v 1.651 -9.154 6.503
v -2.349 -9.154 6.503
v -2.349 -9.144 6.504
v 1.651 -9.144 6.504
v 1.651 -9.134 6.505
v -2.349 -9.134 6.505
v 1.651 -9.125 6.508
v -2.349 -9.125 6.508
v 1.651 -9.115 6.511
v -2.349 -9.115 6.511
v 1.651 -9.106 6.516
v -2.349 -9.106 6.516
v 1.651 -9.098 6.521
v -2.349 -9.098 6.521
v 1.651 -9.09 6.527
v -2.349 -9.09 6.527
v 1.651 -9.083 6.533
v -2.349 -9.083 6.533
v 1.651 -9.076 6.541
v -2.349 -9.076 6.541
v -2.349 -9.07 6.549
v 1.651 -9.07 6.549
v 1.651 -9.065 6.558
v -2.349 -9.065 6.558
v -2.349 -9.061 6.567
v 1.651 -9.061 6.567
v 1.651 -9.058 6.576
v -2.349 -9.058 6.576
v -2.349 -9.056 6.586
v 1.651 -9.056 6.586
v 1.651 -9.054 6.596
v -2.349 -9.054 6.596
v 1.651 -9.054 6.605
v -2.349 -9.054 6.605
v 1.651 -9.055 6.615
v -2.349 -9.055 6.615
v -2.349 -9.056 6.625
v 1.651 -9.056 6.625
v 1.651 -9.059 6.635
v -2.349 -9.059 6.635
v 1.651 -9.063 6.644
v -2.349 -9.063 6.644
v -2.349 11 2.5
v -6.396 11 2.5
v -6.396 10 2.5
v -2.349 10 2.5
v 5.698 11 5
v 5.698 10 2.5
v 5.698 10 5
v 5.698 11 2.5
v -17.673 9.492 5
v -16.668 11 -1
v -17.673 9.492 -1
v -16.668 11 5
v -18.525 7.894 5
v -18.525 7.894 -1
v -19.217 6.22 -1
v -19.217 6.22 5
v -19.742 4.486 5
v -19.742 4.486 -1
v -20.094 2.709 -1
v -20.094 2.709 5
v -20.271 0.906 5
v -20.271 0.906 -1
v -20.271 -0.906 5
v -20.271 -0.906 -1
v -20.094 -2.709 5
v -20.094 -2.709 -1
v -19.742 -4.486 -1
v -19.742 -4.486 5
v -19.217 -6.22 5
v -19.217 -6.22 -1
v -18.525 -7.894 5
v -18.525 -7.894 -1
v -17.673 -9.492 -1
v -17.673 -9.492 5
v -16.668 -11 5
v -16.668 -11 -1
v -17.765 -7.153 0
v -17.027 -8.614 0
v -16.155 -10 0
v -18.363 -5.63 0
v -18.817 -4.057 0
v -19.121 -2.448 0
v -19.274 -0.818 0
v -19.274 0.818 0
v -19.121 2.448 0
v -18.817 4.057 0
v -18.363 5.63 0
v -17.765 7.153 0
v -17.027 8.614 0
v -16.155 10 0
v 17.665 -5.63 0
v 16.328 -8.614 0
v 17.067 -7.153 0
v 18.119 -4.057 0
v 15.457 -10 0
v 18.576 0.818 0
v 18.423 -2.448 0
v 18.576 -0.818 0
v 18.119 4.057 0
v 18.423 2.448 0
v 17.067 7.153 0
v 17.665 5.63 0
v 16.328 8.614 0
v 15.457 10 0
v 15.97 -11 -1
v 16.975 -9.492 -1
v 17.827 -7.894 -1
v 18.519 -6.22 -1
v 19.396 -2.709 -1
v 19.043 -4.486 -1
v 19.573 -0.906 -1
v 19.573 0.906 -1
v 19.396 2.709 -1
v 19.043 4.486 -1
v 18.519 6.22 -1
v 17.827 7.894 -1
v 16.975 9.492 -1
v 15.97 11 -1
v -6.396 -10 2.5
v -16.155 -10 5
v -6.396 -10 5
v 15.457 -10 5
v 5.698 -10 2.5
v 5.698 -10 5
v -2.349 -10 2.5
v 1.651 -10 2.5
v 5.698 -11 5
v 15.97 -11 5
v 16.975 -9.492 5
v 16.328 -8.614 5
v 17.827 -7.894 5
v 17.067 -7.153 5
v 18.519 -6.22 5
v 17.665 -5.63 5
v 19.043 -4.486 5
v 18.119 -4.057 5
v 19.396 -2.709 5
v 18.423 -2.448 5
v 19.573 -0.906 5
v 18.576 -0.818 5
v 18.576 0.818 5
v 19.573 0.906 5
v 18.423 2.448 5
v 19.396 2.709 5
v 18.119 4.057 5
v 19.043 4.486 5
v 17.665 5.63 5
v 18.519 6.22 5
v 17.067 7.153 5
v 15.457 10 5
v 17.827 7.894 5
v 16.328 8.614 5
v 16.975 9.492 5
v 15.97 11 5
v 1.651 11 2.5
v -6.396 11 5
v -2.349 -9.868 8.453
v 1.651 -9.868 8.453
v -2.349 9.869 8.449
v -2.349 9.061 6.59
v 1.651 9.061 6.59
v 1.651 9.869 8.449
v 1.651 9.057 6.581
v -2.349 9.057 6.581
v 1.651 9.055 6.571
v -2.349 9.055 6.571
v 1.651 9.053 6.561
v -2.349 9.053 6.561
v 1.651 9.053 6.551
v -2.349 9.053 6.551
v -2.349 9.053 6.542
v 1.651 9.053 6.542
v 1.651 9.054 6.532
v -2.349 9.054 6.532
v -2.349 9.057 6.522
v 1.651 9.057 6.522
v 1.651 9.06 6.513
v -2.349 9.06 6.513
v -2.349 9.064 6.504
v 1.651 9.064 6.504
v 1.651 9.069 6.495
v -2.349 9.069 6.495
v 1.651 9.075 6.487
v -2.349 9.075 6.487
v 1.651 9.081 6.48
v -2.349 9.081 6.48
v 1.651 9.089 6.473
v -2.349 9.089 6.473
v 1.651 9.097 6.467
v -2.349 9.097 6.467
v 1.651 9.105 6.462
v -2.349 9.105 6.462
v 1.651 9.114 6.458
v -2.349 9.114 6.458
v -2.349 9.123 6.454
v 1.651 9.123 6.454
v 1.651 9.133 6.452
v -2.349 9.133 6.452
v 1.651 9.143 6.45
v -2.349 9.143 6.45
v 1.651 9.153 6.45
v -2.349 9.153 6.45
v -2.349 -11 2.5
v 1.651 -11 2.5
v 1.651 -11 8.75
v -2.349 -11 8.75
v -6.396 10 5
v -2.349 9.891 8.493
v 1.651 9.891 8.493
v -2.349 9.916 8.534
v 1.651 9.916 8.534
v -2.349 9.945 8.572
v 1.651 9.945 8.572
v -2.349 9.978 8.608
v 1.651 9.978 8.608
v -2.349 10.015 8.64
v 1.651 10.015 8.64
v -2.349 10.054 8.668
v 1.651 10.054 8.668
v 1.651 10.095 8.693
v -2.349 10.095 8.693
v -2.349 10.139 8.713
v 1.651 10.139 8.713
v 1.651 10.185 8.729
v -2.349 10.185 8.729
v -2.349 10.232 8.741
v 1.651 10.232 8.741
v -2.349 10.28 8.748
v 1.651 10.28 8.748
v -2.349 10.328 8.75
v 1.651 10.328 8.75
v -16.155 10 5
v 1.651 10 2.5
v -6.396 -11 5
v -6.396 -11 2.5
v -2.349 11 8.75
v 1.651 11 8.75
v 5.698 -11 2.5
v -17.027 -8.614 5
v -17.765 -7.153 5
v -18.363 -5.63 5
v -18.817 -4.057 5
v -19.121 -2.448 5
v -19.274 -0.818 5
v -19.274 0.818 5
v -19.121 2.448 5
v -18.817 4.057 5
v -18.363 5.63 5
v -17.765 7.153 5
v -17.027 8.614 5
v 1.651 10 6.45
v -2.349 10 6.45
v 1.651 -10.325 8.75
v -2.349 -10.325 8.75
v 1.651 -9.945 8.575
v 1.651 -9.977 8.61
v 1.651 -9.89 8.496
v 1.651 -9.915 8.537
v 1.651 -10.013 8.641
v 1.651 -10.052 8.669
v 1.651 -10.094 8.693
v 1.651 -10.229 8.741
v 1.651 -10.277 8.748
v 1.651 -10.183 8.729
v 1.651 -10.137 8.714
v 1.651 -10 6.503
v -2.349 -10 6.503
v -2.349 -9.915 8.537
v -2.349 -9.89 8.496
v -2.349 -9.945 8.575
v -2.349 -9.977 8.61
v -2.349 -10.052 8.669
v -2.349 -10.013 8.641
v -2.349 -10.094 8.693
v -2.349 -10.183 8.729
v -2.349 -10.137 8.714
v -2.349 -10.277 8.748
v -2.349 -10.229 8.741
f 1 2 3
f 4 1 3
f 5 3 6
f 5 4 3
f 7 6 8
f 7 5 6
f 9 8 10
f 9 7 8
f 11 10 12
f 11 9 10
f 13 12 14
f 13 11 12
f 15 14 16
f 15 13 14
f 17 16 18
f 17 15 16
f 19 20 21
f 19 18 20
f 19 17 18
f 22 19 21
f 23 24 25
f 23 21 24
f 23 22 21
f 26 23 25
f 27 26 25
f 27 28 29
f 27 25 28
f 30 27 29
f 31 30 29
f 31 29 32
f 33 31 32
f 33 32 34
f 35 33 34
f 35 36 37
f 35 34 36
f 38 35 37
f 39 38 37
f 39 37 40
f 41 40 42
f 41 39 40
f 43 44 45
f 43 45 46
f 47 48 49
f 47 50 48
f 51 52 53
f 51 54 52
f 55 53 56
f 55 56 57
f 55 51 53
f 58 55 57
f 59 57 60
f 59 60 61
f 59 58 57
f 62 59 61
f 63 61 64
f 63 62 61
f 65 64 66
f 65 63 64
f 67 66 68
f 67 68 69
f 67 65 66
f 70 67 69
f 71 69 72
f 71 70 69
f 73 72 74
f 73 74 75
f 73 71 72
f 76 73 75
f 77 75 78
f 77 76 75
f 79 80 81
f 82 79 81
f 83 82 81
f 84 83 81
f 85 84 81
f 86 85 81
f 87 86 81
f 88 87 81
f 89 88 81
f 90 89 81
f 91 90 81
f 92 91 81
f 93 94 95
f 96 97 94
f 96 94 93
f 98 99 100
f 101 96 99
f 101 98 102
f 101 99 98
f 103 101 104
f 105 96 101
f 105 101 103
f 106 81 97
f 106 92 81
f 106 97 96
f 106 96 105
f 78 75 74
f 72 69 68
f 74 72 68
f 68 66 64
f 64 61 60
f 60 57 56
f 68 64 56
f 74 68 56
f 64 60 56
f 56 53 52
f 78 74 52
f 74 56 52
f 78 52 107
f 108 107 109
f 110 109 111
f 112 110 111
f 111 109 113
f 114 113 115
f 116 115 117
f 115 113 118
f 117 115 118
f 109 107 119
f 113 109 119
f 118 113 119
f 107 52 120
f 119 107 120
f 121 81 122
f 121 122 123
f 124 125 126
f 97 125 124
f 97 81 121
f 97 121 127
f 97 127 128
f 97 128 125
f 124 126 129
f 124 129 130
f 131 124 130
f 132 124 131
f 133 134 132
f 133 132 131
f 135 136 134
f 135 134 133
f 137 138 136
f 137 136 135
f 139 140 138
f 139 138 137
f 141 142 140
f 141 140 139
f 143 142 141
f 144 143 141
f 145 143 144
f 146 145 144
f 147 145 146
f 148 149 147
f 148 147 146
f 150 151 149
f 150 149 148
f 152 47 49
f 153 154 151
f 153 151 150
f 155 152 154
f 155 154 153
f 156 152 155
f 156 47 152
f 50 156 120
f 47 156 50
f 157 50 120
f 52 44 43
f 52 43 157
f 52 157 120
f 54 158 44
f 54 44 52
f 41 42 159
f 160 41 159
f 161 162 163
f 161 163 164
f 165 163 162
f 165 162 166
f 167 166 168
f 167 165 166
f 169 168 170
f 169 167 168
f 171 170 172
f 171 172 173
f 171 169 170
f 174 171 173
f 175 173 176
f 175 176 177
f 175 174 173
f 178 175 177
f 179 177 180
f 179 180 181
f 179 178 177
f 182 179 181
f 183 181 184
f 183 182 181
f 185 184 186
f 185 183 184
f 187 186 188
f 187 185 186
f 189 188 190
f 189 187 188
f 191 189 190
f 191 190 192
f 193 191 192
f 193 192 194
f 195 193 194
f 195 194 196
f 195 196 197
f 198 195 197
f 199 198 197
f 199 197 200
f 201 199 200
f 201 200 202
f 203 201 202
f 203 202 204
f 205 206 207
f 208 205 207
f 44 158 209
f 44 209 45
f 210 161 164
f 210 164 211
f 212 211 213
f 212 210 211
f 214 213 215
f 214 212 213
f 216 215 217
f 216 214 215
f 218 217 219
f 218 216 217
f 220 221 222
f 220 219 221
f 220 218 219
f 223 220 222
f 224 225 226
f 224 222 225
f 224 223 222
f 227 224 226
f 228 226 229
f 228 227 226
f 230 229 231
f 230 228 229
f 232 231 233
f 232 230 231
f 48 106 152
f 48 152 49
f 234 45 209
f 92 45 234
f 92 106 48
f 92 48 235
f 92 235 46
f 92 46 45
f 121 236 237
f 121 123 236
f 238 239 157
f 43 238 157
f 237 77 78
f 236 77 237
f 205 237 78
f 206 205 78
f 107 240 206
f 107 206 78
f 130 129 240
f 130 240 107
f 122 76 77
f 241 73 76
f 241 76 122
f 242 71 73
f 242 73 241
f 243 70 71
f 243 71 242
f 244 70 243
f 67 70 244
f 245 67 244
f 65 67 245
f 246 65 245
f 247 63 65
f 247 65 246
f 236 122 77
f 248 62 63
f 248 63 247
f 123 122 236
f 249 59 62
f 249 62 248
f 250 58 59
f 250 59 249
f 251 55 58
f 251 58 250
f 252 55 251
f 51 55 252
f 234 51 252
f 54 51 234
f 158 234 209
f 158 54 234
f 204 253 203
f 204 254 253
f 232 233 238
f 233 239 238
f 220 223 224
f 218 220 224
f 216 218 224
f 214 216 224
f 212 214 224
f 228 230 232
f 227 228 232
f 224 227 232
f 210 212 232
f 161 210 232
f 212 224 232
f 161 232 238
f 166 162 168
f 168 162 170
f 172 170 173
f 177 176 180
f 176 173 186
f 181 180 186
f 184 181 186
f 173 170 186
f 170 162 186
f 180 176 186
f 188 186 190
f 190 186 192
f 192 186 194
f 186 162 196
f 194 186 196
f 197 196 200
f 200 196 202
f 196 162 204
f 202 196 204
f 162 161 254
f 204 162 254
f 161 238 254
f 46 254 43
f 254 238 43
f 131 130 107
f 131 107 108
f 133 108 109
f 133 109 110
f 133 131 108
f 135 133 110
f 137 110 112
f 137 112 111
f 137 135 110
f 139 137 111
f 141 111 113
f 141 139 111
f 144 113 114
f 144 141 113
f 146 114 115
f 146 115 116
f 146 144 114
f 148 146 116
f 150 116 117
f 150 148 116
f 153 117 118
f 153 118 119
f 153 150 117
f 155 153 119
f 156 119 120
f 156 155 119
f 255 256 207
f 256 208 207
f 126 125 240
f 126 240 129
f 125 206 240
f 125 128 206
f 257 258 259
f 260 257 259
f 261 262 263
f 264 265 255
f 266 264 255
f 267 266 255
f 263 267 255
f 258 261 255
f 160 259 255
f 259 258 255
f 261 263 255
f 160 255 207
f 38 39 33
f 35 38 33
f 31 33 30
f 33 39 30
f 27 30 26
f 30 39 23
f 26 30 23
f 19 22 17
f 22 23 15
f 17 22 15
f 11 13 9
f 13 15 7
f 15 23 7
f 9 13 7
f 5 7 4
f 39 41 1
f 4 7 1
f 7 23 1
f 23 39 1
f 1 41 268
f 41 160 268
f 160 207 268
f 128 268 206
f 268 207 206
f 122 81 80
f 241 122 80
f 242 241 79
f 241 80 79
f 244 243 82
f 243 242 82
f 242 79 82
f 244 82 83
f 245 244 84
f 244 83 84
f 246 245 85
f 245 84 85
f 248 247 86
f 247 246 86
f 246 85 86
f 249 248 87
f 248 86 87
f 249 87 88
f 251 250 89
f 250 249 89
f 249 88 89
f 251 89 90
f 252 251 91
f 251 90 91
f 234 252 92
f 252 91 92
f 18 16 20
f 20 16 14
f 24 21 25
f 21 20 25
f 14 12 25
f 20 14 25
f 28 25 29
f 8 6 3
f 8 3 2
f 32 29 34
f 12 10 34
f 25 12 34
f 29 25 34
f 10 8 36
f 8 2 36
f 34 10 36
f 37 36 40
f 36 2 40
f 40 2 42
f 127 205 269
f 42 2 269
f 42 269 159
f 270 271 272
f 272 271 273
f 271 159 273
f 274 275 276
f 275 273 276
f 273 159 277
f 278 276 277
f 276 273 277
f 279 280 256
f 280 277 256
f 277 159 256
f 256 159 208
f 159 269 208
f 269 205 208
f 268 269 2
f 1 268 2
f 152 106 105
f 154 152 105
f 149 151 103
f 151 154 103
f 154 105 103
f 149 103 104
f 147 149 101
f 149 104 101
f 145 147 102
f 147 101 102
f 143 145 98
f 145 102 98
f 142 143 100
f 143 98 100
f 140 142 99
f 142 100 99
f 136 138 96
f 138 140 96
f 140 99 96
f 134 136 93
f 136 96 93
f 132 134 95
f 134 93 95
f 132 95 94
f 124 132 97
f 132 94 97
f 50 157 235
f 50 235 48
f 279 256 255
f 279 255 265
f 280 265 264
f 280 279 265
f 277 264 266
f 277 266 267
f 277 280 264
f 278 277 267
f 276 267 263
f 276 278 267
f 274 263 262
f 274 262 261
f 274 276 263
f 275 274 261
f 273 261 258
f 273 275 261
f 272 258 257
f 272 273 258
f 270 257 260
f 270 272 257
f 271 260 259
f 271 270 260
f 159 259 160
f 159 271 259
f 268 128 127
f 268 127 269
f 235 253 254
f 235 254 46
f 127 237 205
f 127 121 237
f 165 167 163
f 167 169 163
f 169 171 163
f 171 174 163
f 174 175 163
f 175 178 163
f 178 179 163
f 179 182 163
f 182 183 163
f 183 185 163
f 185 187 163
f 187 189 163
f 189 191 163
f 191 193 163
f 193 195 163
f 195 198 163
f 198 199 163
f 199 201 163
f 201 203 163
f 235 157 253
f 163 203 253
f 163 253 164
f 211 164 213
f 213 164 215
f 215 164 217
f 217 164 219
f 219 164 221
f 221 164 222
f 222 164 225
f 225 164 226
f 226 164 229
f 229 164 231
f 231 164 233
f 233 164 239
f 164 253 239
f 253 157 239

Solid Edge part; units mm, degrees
sketch "Sketch1" plane through (0, 0, 0) normal (0, 0, 1) x (1, 0, 0)
  arc A0 (-16.6681, 11) -> (-16.6681, -11) centre (-1.7936, 0) ccw
  line L0 (-16.6681, -11) -> (15.97, -11)
  arc A1 (15.97, -11) -> (15.97, 11) centre (1.0955, 0) ccw
  line L1 (15.97, 11) -> (-16.6681, 11)
extrude "Protrusion1" add sketch "Sketch1" against normal blind 1
sketch "Sketch2" plane through (0, 0, 0) normal (0, 0, 1) x (1, 0, 0)
  arc A0 (-16.155, 10) -> (-16.155, -10) centre (-1.7936, 0) ccw
  line L0 (-16.155, -10) -> (15.4569, -10)
  arc A1 (15.4569, -10) -> (15.4569, 10) centre (1.0955, 0) ccw
  line L1 (15.4569, 10) -> (-16.155, 10)
  arc A2 (-16.6681, 11) -> (-16.6681, -11) centre (-1.7936, 0) ccw
  line L2 (-16.6681, -11) -> (15.97, -11)
  arc A3 (15.97, -11) -> (15.97, 11) centre (1.0955, 0) ccw
  line L3 (15.97, 11) -> (-16.6681, 11)
  dimension "D1" = 1
extrude "ProtrusioneEstrusa_3" add sketch "Sketch2" along normal blind 5
sketch "Sketch3" plane through (-0.3491, -11, 2) normal (0, -1, 0) x (1, 0, 0)
  line L0 (-6.0472, 3) -> (-6.0472, 0.5)
  line L1 (-6.0472, 0.5) -> (6.0472, 0.5)
  line L2 (6.0472, 0.5) -> (6.0472, 3)
  line L3 (6.0472, 3) -> (-6.0472, 3)
extrude "ScavoEstrusione_1" cut sketch "Sketch3" along normal mid plane 65.044
sketch "Sketch4" plane through (-0.3491, -11, 2) normal (0, -1, 0) x (1, 0, 0)
  line L0 (2, 6.75) -> (2, 0.5)
  line L1 (2, 0.5) -> (0, 0.5)
  line L2 (0, 0.5) -> (-2, 0.5)
  line L3 (-2, 0.5) -> (-2, 6.75)
  line L4 (-2, 6.75) -> (0, 6.75)
  line L5 (0, 6.75) -> (2, 6.75)
extrude "Protrusion2" add sketch "Sketch4" against normal up to vertex (1 mm away)
sketch "Sketch5" plane through (-0.3491, 11, 2) normal (0, 1, 0) x (-1, 0, 0)
  line L0 (-2, 6.75) -> (2, 6.75)
  line L1 (2, 6.75) -> (2, 0.5)
  line L2 (2, 0.5) -> (-2, 0.5)
  line L3 (-2, 0.5) -> (-2, 6.75)
extrude "Protrusion3" add sketch "Sketch5" against normal up to vertex (1 mm away)
sketch "Sketch6" plane through (-2.3491, -10.5, 5.625) normal (-1, 0, 0) x (0, 0, 1)
  line L0 (0.8784, 1.5) -> (3.125, 0.5)
  line L1 (3.125, 0.5) -> (0.8784, 0.5)
  line L2 (0.8784, 0.5) -> (0.8784, 1.5)
  line L3 (3.125, 20.5) -> (0.825, 20.5)
  line L4 (0.825, 20.5) -> (0.825, 19.5)
  line L5 (0.825, 19.5) -> (3.125, 20.5)
extrude "Protrusion4" add sketch "Sketch6" against normal up to vertex (4 mm away)
fillet "Rotondo_1" radius 0.5 2 edges at (-0.3491, -10, 8.75) (-0.3491, 10, 8.75)
fillet "Rotondo_2" radius 0.1 2 edges at (-0.3491, -9, 6.5034) (-0.3491, 9, 6.45)
